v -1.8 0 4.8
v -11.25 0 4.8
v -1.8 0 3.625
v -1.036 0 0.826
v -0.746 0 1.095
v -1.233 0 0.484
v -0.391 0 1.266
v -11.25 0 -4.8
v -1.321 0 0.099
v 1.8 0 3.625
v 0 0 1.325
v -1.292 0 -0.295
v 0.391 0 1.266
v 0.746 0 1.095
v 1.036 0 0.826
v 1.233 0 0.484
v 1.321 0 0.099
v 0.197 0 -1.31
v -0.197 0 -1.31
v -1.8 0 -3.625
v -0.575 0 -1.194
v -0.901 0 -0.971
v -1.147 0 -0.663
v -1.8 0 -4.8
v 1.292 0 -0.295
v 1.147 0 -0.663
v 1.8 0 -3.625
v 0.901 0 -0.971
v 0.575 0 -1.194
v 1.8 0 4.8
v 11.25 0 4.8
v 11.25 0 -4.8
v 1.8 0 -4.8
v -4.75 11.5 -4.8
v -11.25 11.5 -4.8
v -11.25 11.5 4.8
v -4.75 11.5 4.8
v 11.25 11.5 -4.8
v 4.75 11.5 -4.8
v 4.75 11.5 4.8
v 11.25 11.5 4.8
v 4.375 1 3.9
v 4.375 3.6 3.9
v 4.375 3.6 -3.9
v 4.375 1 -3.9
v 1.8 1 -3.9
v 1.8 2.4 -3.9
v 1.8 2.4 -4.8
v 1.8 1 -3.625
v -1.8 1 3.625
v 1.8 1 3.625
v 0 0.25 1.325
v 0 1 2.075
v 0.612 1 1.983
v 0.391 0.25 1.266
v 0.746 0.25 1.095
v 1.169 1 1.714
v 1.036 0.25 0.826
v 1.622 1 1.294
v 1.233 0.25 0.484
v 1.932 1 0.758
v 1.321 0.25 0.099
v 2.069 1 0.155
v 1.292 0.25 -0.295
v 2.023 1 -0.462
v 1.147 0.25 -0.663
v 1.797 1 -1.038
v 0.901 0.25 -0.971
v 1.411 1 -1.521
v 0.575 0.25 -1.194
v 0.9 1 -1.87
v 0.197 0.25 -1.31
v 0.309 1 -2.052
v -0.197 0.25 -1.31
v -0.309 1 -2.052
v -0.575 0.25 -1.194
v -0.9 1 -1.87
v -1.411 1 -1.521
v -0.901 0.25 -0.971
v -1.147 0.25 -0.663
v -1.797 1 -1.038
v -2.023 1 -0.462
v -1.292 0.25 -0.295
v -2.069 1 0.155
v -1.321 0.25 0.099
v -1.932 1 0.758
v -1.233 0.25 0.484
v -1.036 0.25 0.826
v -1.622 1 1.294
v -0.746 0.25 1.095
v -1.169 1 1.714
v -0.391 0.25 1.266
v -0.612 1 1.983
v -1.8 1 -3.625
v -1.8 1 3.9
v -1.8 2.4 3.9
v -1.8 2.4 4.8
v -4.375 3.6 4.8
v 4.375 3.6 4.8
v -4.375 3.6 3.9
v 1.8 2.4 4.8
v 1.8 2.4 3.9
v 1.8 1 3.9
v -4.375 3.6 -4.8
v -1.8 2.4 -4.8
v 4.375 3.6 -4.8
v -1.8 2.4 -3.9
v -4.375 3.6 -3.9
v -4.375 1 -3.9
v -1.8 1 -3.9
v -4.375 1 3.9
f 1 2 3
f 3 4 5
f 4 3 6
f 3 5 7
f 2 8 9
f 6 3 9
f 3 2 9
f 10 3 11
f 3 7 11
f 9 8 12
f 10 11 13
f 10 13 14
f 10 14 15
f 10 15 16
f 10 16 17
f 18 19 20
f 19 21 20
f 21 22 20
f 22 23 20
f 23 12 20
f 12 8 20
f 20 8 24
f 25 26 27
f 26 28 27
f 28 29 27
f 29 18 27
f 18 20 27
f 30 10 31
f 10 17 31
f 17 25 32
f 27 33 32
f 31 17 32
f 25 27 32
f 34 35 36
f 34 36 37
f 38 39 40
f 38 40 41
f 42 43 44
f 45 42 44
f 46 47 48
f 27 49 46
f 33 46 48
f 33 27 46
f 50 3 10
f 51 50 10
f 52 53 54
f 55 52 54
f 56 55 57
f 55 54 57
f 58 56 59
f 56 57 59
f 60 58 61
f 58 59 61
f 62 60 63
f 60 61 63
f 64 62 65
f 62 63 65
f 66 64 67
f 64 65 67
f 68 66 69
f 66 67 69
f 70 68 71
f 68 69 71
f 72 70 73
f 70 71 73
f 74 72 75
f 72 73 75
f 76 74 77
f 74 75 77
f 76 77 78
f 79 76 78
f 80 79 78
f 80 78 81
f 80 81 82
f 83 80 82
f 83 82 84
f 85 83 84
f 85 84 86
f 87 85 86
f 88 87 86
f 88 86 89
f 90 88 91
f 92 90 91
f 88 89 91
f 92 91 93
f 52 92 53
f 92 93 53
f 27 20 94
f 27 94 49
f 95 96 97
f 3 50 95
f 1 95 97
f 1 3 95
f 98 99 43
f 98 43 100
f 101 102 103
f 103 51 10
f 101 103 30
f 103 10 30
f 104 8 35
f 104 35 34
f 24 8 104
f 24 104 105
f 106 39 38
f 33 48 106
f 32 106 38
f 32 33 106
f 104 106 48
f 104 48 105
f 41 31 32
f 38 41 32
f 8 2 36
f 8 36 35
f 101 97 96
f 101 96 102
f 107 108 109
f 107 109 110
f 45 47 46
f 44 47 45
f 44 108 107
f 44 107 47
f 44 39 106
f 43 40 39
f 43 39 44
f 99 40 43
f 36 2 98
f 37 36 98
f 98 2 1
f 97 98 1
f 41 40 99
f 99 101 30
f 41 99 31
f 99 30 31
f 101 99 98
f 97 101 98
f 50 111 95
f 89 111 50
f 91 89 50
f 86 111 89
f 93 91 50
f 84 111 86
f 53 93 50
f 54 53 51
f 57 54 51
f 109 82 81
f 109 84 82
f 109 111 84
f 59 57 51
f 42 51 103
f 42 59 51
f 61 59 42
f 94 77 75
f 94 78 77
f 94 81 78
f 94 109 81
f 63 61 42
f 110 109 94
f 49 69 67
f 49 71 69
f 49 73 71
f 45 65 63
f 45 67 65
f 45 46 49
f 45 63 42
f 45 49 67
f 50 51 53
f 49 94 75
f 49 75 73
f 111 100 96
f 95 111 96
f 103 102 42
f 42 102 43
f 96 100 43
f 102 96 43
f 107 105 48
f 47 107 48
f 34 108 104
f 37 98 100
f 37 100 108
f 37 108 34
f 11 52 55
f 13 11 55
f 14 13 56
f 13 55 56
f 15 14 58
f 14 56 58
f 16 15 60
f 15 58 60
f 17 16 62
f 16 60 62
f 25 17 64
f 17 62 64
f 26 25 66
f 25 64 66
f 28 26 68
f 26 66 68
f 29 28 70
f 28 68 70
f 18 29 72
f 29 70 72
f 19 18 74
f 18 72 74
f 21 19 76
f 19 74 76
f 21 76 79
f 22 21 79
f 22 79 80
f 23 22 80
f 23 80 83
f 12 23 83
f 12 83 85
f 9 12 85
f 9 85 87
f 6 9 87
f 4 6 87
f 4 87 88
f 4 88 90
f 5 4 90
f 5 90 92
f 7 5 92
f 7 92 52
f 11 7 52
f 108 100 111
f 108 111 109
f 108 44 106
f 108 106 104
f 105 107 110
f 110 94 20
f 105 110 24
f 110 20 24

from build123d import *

# Parameters (mm, degrees)
SKETCH1_W           = 22.5
SKETCH1_H           = 9.6
BOSS_EXTRUDE1_DEPTH = 11.5
CUT_EXTRUDE1_DEPTH  = 19.73426006
SKETCH4_W           = 8.75
SKETCH4_H           = 7.8
CUT_EXTRUDE2_DEPTH  = 2.6
SKETCH5_R           = 1.325
CUT_EXTRUDE3_DEPTH  = 17.119941067
CHAMFER1_SIZE       = 0.75
SKETCH6_W           = 3.6
SKETCH6_H           = 1.175
CUT_EXTRUDE4_DEPTH  = 2.4


with BuildPart() as part:
    # Sketch1 → Boss-Extrude1 (new body)
    with BuildSketch(Plane(origin=(0, 0, 0), x_dir=(1, 0, 0), z_dir=(0, 1, 0))):
        Rectangle(SKETCH1_W, SKETCH1_H)
    extrude(amount=BOSS_EXTRUDE1_DEPTH)

    # Sketch3 → Cut-Extrude1 (cut, through all)
    with BuildSketch(Plane.XY.offset(4.8)):
        Polygon((4.75, 11.5), (4.375, 3.6), (-4.375, 3.6), (-4.75, 11.5), align=None)
    extrude(amount=-CUT_EXTRUDE1_DEPTH, mode=Mode.SUBTRACT)

    # Sketch4 → Cut-Extrude2 (cut)
    with BuildSketch(Plane(origin=(0, 3.6, 0), x_dir=(1, 0, 0), z_dir=(0, 1, 0))):
        Rectangle(SKETCH4_W, SKETCH4_H)
    extrude(amount=-CUT_EXTRUDE2_DEPTH, mode=Mode.SUBTRACT)

    # Sketch5 → Cut-Extrude3 (cut, through all)
    with BuildSketch(Plane(origin=(0, 1, 0), x_dir=(1, 0, 0), z_dir=(0, 1, 0))):
        with Locations(Location((0, 0, 0), (0, 0, 270))):
            Circle(SKETCH5_R)
    extrude(amount=-CUT_EXTRUDE3_DEPTH, mode=Mode.SUBTRACT)

    # Chamfer1
    chamfer1_edges = [part.edges().sort_by_distance(p)[0] for p in [
        (0, 1, -1.325),
    ]]
    chamfer(chamfer1_edges, length=CHAMFER1_SIZE)

    # Sketch6 → Cut-Extrude4 (cut)
    with BuildSketch(Plane.XZ):
        with Locations((0, 4.2125)):
            Rectangle(SKETCH6_W, SKETCH6_H)
    cut_extrude4 = extrude(amount=-CUT_EXTRUDE4_DEPTH, mode=Mode.SUBTRACT)

    # Mirror1: Cut-Extrude4 across plane
    add(cut_extrude4.mirror(Plane.XY), mode=Mode.SUBTRACT)


solid = part.part
